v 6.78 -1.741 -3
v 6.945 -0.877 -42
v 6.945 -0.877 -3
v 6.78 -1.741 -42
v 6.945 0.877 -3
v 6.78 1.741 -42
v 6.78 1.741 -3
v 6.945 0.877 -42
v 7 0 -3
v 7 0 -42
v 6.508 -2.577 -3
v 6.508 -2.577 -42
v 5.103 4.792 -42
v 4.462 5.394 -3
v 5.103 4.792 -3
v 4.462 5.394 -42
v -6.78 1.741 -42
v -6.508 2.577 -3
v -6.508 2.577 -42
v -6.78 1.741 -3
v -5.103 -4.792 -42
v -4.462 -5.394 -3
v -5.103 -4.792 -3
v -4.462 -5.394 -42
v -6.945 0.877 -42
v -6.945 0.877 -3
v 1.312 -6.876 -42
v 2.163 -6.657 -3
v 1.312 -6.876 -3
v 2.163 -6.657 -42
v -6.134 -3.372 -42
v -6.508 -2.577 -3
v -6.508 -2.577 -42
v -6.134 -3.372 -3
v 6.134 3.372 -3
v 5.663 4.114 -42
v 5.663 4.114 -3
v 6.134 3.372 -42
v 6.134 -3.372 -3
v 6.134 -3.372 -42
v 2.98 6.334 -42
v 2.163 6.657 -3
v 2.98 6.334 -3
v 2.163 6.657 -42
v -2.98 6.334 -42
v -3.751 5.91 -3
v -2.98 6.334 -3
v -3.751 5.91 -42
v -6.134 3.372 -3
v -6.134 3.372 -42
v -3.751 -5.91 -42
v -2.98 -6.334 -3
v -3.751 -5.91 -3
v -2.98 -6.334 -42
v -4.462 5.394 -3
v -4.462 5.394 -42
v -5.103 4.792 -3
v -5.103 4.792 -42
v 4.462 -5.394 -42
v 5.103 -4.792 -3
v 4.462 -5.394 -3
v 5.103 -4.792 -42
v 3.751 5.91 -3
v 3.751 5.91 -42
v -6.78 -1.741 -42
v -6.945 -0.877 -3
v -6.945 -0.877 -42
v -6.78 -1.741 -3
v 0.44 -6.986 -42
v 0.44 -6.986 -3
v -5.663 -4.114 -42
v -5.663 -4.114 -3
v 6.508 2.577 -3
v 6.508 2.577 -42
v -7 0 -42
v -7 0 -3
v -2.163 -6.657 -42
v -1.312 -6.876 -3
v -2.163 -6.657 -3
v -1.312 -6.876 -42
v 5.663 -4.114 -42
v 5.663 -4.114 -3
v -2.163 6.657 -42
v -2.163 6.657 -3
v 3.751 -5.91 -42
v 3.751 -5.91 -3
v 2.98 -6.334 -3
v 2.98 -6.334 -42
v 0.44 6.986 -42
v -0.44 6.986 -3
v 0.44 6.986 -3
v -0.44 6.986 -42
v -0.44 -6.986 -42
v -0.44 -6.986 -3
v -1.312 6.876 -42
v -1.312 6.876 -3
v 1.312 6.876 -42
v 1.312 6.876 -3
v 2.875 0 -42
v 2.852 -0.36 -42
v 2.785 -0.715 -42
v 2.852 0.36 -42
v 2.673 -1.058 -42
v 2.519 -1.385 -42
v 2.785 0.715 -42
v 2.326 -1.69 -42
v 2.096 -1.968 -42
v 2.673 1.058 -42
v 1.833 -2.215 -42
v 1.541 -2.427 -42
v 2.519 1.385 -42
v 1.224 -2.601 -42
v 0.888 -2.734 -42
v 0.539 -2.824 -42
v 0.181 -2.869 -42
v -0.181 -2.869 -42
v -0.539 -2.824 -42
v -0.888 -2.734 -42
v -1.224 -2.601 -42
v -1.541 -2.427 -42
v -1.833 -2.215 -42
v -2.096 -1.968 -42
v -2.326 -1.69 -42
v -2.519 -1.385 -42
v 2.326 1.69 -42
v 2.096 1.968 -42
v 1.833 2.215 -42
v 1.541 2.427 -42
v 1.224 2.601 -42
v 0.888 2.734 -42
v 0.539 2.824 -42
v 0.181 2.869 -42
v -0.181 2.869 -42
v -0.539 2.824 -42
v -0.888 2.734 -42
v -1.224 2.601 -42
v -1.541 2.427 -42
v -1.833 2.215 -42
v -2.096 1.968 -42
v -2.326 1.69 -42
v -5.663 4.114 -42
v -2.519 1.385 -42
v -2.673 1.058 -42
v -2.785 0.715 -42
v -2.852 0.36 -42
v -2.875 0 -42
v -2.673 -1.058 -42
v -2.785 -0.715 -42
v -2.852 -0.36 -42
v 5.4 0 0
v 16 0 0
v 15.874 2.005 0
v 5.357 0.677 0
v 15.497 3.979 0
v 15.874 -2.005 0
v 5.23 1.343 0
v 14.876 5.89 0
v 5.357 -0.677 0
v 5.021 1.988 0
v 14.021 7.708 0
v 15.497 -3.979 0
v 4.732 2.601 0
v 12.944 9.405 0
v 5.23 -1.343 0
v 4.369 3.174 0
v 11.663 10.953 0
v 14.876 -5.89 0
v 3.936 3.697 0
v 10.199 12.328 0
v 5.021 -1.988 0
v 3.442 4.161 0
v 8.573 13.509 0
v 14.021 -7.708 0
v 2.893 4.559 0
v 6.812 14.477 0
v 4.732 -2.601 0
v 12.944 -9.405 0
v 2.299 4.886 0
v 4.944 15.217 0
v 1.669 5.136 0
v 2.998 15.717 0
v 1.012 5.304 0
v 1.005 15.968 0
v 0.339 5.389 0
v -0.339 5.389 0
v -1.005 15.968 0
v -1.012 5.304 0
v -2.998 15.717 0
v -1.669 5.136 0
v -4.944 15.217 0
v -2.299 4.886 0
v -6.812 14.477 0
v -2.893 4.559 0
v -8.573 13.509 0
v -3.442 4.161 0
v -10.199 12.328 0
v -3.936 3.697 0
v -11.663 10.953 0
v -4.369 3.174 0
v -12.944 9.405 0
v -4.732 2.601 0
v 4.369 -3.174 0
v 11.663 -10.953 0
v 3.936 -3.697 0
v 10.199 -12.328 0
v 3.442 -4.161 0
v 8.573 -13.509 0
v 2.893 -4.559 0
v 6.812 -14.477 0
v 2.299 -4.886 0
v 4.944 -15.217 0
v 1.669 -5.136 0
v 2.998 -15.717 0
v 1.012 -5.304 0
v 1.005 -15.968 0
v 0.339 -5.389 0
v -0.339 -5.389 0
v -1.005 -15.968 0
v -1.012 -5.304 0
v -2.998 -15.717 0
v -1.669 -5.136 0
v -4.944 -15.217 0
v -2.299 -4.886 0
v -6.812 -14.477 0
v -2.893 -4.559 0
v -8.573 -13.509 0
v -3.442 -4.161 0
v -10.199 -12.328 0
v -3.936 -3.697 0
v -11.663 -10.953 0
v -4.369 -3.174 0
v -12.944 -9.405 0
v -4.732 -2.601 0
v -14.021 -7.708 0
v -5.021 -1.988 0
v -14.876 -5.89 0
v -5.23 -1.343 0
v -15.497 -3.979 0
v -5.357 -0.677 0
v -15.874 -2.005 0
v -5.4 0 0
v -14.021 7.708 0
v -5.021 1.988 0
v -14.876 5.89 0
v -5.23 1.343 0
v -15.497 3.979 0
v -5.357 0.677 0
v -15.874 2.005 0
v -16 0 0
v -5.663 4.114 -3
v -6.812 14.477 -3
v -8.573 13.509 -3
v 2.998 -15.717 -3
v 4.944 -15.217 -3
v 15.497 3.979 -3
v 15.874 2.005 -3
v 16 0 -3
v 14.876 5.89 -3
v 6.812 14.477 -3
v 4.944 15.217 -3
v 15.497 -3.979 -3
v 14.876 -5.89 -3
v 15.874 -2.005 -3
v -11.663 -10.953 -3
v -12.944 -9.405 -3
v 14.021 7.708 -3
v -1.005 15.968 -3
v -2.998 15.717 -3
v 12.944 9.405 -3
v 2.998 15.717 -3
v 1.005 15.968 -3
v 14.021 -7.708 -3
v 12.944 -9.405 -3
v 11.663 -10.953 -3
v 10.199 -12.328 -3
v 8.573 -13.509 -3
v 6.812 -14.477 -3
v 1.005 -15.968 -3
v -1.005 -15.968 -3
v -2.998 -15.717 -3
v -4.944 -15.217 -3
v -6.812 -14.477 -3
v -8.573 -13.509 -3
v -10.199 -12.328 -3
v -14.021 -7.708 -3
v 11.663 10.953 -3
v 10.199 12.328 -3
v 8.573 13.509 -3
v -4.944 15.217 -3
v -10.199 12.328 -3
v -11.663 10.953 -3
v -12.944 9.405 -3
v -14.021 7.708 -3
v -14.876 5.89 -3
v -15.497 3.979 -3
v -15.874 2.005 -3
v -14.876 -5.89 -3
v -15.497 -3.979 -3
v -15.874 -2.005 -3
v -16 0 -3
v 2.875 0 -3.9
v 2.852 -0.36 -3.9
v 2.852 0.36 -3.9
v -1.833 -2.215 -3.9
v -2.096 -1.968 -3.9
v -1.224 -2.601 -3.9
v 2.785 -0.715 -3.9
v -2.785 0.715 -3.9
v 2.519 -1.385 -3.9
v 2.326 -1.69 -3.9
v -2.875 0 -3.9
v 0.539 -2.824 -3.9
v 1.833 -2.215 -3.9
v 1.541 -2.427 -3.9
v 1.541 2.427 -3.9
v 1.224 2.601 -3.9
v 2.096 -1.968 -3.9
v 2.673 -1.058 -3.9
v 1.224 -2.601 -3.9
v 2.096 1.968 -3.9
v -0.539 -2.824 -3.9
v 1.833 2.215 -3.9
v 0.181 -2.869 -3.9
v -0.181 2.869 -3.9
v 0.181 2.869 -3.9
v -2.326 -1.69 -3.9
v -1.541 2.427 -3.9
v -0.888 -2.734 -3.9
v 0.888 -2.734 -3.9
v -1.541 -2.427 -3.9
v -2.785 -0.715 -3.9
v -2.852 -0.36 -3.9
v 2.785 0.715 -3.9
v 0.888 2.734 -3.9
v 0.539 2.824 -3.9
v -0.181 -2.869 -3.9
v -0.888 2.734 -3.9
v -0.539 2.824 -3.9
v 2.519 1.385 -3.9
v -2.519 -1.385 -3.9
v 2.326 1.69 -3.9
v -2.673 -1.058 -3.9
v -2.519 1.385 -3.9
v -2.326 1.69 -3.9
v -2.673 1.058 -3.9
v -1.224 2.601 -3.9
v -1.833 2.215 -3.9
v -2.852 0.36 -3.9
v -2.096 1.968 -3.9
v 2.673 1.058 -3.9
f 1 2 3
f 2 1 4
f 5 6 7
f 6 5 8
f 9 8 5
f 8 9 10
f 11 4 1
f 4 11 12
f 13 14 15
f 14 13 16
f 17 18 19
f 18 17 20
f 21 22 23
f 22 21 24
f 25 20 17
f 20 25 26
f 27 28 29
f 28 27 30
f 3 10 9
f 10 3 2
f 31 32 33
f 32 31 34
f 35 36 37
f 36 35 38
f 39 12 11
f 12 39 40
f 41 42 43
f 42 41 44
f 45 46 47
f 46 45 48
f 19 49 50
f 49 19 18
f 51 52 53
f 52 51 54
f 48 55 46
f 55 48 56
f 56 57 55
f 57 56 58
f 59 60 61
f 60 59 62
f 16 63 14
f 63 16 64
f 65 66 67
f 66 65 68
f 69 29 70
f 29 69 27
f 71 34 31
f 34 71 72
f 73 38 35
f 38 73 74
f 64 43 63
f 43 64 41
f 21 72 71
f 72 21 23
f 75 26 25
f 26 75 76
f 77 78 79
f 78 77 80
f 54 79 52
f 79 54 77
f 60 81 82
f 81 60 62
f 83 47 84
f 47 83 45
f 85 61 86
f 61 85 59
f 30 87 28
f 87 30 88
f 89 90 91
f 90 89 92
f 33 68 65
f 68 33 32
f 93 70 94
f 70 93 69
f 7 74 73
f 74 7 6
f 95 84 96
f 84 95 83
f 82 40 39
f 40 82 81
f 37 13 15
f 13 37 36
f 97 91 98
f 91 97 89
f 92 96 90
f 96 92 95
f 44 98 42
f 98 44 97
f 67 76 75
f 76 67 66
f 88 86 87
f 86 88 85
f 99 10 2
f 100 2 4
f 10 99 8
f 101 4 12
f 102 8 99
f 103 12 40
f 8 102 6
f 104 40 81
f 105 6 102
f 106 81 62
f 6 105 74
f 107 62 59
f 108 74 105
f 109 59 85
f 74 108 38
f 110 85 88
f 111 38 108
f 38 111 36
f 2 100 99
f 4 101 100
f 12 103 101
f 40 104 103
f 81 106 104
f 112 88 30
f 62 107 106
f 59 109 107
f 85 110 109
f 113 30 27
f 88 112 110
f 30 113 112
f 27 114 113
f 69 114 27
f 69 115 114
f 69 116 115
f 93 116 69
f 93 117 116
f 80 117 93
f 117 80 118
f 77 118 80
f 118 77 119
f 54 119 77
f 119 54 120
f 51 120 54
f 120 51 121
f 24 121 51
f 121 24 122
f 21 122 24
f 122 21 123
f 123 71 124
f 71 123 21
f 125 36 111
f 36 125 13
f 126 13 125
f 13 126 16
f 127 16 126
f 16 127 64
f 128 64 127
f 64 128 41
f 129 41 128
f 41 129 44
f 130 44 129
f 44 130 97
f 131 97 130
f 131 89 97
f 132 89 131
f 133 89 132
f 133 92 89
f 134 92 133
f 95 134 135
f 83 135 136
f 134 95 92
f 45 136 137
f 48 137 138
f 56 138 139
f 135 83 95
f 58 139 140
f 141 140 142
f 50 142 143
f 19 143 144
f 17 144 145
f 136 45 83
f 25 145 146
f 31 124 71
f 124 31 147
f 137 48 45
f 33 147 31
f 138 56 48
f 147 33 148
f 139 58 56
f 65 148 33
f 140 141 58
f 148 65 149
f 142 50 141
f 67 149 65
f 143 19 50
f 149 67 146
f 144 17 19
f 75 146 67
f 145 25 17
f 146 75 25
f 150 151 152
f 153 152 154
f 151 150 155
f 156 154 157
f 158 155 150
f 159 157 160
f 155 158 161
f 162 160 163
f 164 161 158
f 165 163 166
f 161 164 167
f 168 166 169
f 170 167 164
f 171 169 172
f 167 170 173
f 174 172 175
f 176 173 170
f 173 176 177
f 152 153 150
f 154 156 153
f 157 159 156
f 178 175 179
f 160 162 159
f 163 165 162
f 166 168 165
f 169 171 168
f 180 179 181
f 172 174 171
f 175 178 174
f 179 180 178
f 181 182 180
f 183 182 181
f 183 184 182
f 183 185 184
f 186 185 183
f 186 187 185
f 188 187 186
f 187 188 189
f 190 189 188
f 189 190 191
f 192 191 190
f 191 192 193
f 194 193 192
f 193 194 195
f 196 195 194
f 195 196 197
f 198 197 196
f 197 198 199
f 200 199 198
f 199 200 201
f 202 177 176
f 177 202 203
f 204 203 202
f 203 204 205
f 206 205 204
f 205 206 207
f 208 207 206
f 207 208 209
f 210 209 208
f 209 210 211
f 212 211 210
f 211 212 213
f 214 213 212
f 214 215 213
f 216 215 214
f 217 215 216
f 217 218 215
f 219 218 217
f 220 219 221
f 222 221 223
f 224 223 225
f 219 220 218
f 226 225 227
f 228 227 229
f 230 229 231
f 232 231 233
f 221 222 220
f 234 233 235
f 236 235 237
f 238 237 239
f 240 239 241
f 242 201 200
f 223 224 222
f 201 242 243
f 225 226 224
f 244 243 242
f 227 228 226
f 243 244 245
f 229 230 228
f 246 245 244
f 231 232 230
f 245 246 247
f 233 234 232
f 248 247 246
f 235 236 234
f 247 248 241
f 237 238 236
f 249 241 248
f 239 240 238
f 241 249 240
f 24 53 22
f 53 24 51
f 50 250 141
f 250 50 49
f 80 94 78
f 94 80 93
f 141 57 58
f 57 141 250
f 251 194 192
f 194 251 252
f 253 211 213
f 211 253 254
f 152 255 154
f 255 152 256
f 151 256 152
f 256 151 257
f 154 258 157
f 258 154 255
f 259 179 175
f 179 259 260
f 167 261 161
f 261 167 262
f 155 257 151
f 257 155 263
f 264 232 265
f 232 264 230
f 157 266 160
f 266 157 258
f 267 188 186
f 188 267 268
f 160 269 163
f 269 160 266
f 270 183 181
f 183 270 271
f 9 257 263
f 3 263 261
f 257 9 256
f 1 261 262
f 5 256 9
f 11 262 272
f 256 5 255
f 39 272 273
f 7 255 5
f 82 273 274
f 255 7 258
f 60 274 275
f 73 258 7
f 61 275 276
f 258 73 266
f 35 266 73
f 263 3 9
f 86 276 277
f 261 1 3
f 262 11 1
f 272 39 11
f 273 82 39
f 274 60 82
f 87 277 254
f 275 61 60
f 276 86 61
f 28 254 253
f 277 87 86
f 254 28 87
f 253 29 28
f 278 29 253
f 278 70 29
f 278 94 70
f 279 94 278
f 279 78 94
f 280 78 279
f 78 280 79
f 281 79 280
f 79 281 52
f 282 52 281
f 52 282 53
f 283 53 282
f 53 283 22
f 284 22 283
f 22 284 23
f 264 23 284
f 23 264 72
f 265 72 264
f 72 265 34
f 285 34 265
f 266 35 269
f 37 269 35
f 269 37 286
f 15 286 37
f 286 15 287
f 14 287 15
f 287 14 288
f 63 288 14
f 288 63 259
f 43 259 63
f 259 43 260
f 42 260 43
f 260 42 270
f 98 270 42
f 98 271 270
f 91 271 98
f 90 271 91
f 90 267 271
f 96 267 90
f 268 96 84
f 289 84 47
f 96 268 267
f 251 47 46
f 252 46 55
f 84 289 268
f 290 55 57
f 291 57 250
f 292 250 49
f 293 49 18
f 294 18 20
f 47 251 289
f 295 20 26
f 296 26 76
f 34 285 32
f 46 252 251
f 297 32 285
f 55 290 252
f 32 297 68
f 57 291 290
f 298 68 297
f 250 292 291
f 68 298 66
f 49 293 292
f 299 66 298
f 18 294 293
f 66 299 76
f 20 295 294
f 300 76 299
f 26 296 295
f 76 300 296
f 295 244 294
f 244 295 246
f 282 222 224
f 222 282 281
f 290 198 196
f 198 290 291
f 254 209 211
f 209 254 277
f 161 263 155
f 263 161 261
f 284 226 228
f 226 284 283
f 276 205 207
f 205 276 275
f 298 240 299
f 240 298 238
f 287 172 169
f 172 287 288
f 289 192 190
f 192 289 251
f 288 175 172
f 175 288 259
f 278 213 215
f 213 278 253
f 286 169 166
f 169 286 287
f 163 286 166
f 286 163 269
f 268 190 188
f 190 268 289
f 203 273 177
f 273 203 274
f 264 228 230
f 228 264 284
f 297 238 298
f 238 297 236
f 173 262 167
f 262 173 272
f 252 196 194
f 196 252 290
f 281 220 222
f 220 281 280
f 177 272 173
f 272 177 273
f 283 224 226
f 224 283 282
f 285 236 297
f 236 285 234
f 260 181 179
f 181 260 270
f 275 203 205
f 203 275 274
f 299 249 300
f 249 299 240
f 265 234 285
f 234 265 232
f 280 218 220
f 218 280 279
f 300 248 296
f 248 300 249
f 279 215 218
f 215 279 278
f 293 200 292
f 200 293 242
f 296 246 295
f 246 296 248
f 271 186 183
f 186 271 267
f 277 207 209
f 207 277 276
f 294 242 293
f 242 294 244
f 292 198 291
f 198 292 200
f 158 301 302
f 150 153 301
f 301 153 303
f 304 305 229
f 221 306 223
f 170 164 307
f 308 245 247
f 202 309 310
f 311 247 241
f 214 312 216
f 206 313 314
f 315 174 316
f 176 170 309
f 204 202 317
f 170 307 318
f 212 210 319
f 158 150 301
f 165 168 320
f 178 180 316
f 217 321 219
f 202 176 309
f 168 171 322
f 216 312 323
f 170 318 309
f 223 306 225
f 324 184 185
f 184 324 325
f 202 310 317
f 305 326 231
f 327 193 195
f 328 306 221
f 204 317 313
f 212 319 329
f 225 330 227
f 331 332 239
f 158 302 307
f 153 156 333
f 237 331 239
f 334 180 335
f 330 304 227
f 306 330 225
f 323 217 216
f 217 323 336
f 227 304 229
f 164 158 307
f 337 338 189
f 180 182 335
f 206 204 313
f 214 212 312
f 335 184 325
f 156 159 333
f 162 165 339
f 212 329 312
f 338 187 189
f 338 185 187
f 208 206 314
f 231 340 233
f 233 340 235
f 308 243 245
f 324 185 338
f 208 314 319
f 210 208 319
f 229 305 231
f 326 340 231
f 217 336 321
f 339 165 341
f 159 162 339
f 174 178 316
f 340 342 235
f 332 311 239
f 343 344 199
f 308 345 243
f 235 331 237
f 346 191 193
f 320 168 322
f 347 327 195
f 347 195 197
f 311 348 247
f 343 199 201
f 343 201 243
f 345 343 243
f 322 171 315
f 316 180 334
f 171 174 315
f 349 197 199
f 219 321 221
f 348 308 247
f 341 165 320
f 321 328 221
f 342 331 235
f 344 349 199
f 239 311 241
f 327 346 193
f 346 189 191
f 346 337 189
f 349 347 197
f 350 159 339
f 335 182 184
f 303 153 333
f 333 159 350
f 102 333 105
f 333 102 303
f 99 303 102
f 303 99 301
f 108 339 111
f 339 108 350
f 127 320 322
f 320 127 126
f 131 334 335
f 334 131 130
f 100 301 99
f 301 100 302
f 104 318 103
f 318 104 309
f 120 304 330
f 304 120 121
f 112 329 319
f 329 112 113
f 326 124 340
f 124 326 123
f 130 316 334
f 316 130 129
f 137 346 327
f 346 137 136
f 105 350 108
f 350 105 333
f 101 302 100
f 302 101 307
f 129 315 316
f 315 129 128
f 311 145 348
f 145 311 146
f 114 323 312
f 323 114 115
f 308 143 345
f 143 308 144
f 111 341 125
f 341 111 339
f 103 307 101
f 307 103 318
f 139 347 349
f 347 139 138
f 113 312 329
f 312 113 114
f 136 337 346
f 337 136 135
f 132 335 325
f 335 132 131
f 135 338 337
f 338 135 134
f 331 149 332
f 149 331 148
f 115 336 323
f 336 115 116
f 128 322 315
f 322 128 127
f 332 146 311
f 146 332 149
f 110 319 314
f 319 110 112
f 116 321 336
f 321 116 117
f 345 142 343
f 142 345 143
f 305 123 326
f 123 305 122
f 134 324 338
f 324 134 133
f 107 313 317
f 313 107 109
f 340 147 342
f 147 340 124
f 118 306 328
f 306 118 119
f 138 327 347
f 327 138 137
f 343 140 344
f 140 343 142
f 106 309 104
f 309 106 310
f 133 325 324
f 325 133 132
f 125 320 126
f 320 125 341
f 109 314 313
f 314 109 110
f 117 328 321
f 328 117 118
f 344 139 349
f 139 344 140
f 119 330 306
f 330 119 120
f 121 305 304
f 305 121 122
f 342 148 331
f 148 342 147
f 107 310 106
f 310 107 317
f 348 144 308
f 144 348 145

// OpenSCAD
$fn = 50;


difference() {
	union() {
		translate(v = [0, 0, -42.0000000000]) {
			cylinder(h = 42, r = 7.0000000000);
		}
		translate(v = [0, 0, -3.0000000000]) {
			cylinder(h = 3, r = 16.0000000000);
		}
	}
	union() {
		translate(v = [0, 0, 0]) {
			rotate(a = [0, 0, 0]) {
				difference() {
					union() {
						#translate(v = [0, 0, -42.0000000000]) {
							cylinder(h = 42, r = 2.6000000000);
						}
						#translate(v = [0, 0, -3.9000000000]) {
							cylinder(h = 3.9000000000, r = 7.0000000000, r1 = 2.8750000000, r2 = 5.4000000000);
						}
						#translate(v = [0, 0, -42.0000000000]) {
							cylinder(h = 42, r = 2.8750000000);
						}
						#translate(v = [0, 0, -42.0000000000]) {
							cylinder(h = 42, r = 2.6000000000);
						}
					}
					union();
				}
			}
		}
	}
}
